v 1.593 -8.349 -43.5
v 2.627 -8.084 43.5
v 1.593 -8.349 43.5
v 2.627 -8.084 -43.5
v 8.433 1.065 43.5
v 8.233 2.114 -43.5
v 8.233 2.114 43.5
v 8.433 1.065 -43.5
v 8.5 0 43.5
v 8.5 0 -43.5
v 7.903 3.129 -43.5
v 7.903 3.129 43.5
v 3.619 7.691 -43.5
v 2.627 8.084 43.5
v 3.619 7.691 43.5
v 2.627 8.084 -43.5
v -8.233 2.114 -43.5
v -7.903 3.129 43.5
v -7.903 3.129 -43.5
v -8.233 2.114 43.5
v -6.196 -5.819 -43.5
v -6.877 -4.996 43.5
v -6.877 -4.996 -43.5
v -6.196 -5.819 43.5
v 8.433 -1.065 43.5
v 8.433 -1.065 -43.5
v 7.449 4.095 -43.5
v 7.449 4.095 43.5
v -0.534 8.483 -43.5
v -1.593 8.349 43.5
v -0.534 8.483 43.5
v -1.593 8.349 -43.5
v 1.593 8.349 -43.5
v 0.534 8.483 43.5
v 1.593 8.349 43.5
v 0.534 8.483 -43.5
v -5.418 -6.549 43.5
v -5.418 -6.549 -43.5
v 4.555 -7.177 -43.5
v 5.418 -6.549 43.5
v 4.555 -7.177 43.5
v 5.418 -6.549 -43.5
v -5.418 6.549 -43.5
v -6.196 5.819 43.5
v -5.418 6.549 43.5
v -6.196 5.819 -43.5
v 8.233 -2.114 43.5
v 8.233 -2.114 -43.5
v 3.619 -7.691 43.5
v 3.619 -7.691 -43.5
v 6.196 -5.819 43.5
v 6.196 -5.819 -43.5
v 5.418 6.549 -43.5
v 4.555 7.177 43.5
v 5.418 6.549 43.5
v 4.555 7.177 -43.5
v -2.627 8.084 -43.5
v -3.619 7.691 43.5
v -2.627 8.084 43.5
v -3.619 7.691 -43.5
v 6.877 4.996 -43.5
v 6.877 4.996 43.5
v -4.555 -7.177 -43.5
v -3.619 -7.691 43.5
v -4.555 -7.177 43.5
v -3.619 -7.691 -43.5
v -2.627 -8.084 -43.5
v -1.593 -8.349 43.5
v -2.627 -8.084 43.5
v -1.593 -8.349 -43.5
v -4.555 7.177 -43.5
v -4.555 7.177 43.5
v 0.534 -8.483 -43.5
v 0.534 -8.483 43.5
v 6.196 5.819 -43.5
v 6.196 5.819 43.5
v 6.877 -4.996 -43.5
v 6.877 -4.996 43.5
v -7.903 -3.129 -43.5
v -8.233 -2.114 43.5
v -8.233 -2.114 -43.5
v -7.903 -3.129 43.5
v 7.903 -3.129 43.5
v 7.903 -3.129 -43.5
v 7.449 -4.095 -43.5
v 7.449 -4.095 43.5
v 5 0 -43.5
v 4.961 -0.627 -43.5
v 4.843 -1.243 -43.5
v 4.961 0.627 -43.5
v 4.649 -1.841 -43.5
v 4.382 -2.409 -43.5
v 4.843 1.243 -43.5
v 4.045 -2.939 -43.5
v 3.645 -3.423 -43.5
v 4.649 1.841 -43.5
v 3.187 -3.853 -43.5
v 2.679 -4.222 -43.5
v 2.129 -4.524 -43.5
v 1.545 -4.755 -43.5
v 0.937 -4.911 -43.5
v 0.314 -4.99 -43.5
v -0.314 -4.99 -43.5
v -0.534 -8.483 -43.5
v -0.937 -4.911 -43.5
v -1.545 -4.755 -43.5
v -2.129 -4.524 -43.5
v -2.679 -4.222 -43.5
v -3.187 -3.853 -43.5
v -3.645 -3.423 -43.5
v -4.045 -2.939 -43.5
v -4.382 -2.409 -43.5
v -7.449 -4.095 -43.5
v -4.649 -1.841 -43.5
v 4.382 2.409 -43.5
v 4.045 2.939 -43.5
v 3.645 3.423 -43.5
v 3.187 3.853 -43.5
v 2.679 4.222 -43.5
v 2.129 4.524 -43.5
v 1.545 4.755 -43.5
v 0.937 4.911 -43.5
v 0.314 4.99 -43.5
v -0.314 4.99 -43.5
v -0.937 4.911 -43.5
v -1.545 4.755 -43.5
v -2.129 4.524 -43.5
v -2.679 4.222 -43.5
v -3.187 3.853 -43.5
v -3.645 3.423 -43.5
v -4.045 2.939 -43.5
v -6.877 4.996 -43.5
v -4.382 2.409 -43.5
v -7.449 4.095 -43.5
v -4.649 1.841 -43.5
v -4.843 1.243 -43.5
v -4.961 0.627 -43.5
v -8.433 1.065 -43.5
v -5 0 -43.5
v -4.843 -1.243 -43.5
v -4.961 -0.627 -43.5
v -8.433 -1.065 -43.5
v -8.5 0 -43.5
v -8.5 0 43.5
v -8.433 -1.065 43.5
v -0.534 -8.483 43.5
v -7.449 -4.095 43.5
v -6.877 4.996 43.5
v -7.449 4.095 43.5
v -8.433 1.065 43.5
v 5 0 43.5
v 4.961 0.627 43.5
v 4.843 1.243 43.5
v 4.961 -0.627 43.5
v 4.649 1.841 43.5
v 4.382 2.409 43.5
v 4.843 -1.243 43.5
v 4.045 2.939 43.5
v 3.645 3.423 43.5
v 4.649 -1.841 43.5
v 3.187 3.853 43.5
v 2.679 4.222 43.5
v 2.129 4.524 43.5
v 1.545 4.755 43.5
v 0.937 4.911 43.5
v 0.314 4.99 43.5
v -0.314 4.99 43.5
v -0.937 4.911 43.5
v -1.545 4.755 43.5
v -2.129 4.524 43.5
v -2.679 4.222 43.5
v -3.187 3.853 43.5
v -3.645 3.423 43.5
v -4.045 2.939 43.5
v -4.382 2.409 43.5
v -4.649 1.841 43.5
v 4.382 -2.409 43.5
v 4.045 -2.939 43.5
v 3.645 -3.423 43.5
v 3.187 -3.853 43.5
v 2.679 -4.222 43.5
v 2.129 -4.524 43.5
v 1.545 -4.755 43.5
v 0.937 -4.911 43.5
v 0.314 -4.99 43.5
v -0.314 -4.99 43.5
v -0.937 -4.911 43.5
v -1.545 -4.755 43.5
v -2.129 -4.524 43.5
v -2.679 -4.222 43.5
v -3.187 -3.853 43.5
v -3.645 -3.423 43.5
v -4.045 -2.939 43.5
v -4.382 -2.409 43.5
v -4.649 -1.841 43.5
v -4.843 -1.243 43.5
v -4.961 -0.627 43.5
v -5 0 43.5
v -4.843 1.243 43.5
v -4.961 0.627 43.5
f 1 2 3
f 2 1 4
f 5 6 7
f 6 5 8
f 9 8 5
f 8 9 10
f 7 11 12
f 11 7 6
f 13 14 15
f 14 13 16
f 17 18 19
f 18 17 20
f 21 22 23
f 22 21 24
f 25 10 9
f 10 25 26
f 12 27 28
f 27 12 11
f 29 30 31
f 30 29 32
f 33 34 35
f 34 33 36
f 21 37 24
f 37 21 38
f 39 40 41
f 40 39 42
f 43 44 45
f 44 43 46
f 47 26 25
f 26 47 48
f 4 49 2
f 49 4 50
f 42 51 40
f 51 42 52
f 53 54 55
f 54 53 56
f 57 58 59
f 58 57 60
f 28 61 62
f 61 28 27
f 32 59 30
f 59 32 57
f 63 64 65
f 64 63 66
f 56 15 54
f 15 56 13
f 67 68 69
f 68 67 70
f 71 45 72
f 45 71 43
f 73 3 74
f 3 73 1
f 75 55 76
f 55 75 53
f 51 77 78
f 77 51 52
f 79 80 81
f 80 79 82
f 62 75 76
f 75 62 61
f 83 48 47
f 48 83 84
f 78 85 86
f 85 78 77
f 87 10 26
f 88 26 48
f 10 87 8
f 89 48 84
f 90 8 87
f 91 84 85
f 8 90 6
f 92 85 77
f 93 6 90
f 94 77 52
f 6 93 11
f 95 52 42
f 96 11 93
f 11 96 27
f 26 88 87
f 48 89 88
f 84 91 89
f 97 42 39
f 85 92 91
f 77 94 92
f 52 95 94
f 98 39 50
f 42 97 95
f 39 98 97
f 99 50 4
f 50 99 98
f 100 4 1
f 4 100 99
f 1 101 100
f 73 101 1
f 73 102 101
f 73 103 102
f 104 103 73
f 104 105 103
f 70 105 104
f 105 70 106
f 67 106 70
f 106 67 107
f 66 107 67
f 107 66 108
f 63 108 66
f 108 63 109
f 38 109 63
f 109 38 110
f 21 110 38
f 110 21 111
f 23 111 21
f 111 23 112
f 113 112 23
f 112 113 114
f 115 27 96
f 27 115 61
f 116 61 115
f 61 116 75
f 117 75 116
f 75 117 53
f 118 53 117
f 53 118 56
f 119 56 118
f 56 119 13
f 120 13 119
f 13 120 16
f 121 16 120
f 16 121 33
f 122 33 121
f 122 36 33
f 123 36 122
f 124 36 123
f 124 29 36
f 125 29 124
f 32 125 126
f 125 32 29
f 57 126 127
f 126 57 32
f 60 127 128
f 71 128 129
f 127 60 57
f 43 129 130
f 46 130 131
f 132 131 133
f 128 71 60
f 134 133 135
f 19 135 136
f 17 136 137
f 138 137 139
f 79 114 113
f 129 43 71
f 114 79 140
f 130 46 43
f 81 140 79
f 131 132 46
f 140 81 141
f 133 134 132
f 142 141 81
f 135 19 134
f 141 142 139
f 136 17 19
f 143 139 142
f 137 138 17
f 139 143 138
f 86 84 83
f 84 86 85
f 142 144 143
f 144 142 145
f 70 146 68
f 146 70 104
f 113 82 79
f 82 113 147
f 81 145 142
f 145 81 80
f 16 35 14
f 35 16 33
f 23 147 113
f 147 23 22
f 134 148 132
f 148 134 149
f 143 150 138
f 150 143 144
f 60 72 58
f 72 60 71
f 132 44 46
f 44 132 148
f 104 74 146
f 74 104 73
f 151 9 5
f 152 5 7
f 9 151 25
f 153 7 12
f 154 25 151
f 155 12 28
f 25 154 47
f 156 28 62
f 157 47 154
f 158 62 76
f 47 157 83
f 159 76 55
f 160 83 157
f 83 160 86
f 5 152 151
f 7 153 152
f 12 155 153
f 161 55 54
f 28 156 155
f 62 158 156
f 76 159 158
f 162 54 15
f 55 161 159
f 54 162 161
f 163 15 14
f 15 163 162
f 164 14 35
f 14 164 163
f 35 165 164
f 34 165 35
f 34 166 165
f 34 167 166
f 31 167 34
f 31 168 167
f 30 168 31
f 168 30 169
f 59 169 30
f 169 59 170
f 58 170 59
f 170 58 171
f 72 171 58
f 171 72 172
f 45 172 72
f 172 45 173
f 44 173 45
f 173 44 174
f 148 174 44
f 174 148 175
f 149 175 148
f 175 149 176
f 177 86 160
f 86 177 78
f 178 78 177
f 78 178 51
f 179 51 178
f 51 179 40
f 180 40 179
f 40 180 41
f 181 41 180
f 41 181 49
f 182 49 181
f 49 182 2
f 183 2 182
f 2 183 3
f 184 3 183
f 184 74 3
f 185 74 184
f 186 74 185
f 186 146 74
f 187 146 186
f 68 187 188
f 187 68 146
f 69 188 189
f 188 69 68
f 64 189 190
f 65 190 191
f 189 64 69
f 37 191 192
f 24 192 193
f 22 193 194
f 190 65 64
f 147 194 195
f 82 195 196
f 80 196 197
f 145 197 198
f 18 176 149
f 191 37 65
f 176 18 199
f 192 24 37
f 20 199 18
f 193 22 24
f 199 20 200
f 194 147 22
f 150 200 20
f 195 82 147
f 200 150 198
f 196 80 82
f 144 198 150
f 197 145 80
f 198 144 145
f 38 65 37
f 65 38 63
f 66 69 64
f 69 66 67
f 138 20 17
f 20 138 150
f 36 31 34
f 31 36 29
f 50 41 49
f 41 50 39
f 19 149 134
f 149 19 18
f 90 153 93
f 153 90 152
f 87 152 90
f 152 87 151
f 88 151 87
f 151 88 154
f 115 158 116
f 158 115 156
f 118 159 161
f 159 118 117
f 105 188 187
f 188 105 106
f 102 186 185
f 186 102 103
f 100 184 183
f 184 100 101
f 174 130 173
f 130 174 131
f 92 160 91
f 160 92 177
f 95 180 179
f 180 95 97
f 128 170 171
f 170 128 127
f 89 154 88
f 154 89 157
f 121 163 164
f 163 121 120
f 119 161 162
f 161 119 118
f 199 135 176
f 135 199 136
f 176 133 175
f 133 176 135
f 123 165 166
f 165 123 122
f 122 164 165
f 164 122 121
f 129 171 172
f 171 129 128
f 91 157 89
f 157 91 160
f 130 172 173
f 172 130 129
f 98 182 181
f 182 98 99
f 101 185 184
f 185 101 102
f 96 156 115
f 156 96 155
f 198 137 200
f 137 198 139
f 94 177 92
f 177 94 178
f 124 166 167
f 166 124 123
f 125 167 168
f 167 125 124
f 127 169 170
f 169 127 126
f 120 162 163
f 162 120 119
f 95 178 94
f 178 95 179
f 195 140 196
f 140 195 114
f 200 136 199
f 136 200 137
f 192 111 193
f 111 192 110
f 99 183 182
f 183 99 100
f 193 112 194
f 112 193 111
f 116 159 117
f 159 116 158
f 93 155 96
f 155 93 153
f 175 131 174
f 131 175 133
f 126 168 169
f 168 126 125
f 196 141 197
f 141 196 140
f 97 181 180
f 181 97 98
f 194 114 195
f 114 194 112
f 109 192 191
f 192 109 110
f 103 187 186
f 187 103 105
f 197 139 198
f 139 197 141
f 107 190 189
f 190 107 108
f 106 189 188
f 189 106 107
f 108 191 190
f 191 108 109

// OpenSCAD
$fn = 50;


difference() {
	union() {
		translate(v = [0, 0, -43.5000000000]) {
			cylinder(h = 87, r = 8.5000000000);
		}
	}
	union() {
		translate(v = [0, 0, -100.0000000000]) {
			cylinder(h = 200, r = 5.0000000000);
		}
	}
}
